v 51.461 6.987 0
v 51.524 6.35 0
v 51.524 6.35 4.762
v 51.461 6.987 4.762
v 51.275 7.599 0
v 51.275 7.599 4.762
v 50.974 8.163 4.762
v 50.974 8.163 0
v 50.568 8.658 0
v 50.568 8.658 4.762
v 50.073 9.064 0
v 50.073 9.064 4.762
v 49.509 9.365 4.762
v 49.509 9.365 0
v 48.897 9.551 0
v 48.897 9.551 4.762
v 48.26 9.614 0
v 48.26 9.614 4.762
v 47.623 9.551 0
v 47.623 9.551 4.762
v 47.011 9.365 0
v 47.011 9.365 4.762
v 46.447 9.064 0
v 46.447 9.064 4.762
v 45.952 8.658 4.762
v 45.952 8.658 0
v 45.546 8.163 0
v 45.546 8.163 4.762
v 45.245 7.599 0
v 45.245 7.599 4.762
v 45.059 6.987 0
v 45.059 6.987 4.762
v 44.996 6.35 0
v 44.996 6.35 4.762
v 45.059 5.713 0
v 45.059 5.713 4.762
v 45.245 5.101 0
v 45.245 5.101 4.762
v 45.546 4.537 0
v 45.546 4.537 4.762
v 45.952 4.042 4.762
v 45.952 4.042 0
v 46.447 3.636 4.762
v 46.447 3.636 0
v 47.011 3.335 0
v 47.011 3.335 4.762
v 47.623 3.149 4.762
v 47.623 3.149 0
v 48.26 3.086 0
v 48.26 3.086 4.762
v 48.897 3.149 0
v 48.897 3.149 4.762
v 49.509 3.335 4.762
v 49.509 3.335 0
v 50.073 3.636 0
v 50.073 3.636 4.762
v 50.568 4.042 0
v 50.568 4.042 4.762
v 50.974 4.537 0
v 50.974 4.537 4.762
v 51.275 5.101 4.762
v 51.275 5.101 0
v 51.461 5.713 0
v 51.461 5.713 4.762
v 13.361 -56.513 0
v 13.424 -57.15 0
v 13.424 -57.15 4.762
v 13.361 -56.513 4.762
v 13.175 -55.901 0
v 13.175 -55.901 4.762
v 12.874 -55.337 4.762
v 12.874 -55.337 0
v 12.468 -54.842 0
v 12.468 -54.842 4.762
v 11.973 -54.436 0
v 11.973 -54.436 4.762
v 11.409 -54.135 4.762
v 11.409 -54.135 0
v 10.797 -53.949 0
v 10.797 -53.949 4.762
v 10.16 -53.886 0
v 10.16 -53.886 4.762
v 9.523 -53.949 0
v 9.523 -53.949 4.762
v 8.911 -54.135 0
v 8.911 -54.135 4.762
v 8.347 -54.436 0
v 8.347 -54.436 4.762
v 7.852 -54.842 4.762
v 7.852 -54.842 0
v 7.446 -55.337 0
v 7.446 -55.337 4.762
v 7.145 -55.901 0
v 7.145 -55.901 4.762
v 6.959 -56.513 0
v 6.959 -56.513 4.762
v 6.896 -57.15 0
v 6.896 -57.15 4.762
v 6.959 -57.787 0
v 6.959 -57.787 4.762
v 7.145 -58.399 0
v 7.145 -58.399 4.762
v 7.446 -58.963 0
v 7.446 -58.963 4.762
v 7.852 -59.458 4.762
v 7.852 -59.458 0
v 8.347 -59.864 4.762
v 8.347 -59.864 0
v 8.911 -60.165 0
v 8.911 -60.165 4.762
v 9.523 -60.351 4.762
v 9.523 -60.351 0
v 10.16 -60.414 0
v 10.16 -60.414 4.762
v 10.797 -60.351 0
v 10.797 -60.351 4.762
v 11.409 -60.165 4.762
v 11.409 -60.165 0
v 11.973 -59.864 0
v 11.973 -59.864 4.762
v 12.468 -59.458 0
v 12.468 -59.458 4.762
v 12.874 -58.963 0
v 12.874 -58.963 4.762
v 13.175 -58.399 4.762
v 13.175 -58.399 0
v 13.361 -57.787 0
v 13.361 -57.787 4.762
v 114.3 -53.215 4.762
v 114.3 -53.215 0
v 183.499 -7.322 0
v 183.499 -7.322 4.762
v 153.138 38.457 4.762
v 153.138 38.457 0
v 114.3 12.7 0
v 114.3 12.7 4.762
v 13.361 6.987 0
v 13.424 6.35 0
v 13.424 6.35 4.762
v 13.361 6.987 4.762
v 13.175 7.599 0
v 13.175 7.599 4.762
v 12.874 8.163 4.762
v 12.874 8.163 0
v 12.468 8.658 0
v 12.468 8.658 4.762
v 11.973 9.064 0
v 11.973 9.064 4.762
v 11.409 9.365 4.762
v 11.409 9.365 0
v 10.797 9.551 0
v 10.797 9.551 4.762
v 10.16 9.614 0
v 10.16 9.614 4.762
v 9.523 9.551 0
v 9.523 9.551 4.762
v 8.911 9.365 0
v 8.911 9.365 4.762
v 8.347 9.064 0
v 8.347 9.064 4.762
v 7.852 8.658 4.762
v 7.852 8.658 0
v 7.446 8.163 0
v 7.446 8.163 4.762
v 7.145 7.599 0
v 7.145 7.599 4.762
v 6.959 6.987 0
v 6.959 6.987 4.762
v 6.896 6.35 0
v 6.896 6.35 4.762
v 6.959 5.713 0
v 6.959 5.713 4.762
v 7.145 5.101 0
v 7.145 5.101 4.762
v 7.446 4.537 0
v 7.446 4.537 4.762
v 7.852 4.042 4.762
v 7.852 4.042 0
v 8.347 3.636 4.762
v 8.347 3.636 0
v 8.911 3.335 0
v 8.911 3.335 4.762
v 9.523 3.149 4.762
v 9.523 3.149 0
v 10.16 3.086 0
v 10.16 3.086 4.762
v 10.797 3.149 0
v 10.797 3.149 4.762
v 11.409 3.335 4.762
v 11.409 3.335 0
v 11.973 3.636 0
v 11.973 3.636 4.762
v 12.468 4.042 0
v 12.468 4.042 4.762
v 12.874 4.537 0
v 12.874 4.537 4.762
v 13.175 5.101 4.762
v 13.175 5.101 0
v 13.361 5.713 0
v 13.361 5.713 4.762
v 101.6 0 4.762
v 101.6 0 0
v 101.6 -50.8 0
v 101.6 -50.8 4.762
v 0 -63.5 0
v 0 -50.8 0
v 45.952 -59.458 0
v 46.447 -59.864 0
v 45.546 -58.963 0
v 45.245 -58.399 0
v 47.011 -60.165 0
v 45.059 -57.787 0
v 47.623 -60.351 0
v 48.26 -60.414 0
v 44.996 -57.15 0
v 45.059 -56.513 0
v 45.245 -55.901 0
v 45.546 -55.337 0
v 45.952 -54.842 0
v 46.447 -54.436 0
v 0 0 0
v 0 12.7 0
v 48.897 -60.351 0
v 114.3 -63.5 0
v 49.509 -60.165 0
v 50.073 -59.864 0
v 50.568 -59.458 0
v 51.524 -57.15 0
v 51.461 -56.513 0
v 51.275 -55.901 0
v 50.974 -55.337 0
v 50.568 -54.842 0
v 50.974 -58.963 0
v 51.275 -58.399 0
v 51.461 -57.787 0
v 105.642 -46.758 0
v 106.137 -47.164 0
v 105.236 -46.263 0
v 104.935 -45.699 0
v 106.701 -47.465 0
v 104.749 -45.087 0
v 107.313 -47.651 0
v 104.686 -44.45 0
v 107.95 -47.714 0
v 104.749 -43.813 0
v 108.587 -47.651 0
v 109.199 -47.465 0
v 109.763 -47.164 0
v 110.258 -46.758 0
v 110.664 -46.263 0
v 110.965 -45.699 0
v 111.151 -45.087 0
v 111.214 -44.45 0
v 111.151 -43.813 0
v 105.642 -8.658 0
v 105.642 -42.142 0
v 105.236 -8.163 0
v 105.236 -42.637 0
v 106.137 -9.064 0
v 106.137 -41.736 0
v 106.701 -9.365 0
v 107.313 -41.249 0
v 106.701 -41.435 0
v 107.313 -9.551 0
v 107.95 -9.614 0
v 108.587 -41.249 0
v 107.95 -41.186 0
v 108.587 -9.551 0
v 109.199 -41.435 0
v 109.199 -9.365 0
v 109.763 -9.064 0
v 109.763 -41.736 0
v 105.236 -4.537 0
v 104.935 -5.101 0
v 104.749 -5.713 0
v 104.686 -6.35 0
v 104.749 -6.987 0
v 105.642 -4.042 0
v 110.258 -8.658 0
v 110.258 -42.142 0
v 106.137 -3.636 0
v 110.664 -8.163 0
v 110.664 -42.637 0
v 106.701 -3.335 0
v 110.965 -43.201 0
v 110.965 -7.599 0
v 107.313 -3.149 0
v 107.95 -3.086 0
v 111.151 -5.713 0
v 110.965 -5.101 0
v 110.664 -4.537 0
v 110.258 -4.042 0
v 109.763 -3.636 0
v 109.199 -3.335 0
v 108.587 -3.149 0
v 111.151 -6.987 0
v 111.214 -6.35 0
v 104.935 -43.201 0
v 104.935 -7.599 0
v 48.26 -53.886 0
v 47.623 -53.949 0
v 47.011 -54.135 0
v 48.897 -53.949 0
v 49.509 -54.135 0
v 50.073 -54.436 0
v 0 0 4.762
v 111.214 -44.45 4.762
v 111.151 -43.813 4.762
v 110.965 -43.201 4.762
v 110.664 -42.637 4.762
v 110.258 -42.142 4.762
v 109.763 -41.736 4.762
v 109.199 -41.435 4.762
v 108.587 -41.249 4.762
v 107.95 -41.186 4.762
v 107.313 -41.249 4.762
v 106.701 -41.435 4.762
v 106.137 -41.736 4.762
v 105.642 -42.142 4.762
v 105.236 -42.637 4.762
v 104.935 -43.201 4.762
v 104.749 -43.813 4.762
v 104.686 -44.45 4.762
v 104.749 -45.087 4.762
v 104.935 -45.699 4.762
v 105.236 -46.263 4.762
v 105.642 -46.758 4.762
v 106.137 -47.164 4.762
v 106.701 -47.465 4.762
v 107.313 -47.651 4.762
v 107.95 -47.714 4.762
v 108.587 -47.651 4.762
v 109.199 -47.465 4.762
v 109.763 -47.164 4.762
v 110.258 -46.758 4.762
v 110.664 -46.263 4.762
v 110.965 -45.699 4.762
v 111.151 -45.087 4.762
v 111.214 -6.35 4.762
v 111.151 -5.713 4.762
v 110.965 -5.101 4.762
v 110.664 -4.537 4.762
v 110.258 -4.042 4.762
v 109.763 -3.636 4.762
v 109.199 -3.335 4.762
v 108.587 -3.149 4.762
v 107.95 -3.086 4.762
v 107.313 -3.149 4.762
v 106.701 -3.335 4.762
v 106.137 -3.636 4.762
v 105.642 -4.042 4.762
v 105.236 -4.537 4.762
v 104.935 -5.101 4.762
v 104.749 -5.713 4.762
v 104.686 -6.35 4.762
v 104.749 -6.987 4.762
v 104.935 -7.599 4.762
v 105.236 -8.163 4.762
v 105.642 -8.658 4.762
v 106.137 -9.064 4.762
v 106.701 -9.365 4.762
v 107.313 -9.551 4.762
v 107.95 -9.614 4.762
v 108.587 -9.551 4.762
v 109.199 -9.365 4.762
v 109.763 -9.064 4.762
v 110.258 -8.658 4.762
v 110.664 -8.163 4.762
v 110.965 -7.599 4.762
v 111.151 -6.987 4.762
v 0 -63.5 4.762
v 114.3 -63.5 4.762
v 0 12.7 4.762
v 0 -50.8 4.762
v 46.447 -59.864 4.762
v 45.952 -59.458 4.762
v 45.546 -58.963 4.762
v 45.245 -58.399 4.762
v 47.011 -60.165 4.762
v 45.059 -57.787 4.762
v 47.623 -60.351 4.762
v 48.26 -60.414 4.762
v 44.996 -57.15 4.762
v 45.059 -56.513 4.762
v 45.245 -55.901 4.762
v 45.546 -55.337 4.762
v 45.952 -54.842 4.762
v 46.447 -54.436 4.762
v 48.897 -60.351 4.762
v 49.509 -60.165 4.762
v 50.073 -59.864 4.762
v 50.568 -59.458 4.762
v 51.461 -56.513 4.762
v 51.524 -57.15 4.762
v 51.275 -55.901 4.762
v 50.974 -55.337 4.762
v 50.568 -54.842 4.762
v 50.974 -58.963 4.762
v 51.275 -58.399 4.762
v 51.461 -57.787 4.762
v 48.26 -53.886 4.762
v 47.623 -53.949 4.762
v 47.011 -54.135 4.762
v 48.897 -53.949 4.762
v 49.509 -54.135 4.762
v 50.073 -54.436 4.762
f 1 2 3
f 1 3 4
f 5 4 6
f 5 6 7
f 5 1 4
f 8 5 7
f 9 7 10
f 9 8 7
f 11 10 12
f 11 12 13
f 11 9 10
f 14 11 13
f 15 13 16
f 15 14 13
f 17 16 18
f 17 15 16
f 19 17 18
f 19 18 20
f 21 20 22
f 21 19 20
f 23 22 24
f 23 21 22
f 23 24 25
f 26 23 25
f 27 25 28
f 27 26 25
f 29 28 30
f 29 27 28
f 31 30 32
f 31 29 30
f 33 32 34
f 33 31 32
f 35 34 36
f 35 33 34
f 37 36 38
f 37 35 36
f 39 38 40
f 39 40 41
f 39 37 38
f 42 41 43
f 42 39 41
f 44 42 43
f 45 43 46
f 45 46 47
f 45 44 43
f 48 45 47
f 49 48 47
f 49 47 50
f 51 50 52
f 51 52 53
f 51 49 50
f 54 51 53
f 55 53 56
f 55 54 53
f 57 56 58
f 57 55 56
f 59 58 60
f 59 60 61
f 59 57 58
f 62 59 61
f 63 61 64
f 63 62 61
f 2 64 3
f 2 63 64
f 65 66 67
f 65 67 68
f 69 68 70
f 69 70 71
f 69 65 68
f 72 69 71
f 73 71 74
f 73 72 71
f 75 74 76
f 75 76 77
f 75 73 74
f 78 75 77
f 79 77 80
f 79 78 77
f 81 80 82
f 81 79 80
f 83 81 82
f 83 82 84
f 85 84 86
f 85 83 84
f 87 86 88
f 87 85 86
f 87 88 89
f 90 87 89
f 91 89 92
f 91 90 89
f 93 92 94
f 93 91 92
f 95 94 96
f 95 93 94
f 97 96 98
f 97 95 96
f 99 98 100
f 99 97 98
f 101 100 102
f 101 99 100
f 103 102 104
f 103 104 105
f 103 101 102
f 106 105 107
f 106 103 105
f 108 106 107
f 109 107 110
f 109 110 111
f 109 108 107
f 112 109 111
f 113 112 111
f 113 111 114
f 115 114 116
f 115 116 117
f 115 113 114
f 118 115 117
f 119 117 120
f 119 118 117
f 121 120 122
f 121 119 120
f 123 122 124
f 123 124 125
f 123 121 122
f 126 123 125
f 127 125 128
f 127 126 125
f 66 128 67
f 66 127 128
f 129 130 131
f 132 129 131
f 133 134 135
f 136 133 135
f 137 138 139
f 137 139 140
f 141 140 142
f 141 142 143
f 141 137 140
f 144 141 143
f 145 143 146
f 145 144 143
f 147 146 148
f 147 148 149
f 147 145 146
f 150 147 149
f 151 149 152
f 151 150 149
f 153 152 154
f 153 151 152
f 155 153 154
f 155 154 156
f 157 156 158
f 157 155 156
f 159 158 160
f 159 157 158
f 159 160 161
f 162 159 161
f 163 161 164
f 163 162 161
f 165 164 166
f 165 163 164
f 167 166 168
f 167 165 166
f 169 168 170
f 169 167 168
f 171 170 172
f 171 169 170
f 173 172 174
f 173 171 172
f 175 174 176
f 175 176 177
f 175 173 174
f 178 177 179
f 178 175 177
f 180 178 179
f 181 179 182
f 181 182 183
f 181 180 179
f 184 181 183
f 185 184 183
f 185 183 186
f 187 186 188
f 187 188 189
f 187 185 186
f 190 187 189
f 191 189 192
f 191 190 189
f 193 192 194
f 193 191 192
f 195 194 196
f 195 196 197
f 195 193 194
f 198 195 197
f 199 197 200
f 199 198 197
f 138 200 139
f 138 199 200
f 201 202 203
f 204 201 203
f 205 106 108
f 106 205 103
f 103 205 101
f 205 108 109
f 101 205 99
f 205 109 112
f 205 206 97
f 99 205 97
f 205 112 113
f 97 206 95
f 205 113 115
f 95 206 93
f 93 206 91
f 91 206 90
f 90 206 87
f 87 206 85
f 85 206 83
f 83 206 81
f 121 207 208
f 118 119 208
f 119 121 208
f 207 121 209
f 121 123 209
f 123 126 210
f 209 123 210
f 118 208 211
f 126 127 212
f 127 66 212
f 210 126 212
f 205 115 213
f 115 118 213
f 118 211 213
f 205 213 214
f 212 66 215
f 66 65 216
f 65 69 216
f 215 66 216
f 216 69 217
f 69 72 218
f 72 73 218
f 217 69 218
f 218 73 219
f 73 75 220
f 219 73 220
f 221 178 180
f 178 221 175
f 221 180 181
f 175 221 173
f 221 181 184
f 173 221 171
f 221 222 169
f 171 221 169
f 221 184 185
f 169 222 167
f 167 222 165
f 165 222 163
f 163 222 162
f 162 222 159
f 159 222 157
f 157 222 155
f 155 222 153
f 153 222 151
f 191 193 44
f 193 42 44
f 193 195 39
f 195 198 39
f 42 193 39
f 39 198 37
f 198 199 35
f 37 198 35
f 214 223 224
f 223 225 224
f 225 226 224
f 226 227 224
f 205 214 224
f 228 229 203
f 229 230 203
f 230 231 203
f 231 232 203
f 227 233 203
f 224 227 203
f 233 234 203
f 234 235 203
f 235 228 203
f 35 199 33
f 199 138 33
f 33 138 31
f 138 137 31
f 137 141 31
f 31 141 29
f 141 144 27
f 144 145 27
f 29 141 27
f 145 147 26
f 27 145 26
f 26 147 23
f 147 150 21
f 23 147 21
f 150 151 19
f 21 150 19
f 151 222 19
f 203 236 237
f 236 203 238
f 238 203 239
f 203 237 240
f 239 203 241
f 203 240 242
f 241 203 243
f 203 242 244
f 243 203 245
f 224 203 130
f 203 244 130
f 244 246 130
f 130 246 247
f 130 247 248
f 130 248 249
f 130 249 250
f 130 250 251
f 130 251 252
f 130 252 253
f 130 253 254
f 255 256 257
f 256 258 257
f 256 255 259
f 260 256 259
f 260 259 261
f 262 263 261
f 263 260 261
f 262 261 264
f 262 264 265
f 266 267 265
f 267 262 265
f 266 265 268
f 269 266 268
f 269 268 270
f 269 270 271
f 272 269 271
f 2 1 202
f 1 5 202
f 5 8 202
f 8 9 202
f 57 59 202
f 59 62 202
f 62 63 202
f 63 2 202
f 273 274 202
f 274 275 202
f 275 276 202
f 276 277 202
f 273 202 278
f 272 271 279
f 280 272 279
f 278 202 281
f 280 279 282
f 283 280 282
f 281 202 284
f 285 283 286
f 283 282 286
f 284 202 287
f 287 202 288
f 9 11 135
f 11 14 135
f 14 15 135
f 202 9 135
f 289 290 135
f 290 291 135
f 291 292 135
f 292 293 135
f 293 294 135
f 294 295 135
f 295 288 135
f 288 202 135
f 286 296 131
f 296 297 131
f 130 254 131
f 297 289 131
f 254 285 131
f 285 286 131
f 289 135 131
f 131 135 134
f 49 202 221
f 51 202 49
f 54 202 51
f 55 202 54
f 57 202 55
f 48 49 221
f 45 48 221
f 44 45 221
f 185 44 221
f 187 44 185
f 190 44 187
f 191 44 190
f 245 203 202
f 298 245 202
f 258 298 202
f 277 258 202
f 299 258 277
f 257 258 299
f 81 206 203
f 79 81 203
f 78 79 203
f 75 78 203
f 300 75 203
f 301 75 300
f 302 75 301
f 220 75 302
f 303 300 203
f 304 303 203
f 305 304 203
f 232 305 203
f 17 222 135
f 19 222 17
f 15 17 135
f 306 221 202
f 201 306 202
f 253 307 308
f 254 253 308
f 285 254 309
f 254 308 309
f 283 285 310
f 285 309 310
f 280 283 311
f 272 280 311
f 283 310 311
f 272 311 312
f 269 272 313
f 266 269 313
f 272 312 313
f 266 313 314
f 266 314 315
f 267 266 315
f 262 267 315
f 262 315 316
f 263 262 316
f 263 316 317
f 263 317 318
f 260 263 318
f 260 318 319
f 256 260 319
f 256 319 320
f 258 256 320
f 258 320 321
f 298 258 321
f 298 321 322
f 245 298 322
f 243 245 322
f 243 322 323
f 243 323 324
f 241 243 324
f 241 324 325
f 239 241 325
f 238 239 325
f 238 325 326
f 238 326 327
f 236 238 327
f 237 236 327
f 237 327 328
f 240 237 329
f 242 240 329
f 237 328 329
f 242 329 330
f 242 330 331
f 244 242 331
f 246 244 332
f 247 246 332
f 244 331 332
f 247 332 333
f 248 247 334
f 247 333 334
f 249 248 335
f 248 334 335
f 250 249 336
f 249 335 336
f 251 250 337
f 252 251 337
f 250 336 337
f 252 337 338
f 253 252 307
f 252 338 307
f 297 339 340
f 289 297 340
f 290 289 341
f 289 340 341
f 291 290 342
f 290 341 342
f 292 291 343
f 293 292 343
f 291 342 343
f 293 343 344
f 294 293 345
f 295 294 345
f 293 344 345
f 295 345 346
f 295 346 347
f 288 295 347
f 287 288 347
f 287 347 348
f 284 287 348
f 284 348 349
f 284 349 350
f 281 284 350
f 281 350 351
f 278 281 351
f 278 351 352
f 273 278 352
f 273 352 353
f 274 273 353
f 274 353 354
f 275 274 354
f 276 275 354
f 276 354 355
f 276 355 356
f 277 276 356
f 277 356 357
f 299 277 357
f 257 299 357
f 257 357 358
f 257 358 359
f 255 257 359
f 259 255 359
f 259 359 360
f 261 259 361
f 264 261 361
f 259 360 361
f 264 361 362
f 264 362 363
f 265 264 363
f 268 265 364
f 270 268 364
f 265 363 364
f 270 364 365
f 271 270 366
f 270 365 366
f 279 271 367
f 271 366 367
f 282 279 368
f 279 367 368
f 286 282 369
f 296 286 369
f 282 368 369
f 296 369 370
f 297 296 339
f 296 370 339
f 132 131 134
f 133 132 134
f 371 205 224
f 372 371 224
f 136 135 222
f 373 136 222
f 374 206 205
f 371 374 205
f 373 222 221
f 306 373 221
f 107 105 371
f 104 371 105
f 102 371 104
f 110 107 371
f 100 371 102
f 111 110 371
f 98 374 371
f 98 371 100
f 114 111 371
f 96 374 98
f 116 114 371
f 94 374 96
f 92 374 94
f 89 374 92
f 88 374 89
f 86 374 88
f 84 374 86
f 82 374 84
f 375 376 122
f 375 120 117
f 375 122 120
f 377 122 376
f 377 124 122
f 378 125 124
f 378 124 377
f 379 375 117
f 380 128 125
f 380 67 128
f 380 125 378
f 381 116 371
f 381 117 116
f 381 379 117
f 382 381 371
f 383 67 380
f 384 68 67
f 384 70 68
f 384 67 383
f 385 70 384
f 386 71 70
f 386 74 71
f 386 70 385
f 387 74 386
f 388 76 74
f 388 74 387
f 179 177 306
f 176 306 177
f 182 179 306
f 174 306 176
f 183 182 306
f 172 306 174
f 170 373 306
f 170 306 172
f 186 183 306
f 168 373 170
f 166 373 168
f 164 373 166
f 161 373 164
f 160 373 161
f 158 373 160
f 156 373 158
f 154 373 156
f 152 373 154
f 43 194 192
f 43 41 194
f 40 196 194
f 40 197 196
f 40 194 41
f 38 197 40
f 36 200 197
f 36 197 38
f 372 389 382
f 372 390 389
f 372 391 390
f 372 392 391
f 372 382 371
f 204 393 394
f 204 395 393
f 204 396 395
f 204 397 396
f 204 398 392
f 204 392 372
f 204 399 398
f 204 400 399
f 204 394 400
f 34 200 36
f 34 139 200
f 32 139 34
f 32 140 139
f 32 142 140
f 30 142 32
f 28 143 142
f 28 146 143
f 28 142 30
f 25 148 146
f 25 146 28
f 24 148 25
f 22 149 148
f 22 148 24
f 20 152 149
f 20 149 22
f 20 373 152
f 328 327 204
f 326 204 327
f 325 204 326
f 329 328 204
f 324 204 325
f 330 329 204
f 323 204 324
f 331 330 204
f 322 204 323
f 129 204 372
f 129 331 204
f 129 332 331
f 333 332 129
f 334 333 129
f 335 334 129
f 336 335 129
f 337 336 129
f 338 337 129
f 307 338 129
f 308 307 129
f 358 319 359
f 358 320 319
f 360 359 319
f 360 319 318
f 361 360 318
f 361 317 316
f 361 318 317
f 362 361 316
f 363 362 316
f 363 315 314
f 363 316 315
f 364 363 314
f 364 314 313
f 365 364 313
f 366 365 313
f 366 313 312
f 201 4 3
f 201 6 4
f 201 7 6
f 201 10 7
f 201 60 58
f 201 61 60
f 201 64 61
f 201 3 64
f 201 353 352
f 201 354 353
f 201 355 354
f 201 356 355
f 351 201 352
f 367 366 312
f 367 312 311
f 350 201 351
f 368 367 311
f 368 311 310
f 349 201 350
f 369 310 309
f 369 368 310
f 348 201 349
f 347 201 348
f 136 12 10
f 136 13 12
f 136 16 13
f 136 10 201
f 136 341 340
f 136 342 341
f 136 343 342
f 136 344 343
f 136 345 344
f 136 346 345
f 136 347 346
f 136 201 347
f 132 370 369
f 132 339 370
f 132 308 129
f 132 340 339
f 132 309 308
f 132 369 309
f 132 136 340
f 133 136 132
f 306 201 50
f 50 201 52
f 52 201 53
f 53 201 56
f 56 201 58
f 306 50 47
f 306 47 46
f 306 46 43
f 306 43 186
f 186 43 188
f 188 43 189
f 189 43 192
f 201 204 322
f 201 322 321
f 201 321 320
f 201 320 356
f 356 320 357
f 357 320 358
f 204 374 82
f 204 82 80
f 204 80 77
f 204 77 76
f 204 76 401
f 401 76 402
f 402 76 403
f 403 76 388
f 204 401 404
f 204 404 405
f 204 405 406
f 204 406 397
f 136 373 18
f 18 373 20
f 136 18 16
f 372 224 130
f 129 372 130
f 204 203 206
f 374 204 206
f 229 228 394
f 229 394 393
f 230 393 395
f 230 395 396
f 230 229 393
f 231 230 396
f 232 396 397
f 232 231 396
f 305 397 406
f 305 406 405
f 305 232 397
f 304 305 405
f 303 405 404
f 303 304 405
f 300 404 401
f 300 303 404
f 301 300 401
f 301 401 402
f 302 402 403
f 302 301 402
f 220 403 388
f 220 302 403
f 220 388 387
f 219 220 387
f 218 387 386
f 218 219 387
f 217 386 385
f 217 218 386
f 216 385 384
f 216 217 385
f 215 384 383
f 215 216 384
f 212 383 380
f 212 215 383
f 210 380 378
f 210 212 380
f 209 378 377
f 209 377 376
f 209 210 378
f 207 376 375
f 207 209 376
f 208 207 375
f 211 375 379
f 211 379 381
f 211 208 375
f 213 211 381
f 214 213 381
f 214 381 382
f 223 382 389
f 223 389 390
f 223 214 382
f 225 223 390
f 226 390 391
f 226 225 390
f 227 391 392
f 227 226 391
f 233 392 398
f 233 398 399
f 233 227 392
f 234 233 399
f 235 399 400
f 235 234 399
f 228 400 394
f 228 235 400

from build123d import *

# Parameters (mm, degrees)
SKETCH1_R           = 3.2639
BOSS_EXTRUDE1_DEPTH = 4.7625
CUT_EXTRUDE1_REACH  = 6.763
SKETCH2_R           = 3.2639


with BuildPart() as part:
    # Sketch1 → Boss-Extrude1 (new body)
    with BuildSketch(Plane.XY):
        Polygon((0, 0), (101.6, 0), (101.6, -50.8), (0, -50.8), (0, -63.5), (114.3, -63.5), (114.3, -53.215281422), (183.499345052, -7.322414016), (153.138236671, 38.457440977), (114.3, 12.7), (0, 12.7), align=None)
        with Locations((10.16, 6.35)):
            Circle(SKETCH1_R, mode=Mode.SUBTRACT)
        with Locations((48.26, 6.35)):
            Circle(SKETCH1_R, mode=Mode.SUBTRACT)
        with Locations((10.16, -57.15)):
            Circle(SKETCH1_R, mode=Mode.SUBTRACT)
        with Locations((48.26, -57.15)):
            Circle(SKETCH1_R, mode=Mode.SUBTRACT)
    extrude(amount=BOSS_EXTRUDE1_DEPTH)

    # Sketch2 → Cut-Extrude1 (cut, up to next)
    with BuildSketch(Plane.XY.offset(4.7625), mode=Mode.PRIVATE) as cut_extrude1_sk1:
        with Locations((107.95, -6.35)):
            Circle(SKETCH2_R)
    cut_extrude1_tool1 = extrude(cut_extrude1_sk1.sketch, amount=-CUT_EXTRUDE1_REACH, mode=Mode.PRIVATE) & part.part
    add(cut_extrude1_tool1.solids().sort_by_distance((107.95, -6.35, 4.7625))[0], mode=Mode.SUBTRACT)
    # Sketch2 → Cut-Extrude1 (cut, up to next)
    with BuildSketch(Plane.XY.offset(4.7625), mode=Mode.PRIVATE) as cut_extrude1_sk2:
        with Locations((107.95, -44.45)):
            Circle(SKETCH2_R)
    cut_extrude1_tool2 = extrude(cut_extrude1_sk2.sketch, amount=-CUT_EXTRUDE1_REACH, mode=Mode.PRIVATE) & part.part
    add(cut_extrude1_tool2.solids().sort_by_distance((107.95, -44.45, 4.7625))[0], mode=Mode.SUBTRACT)


solid = part.part
